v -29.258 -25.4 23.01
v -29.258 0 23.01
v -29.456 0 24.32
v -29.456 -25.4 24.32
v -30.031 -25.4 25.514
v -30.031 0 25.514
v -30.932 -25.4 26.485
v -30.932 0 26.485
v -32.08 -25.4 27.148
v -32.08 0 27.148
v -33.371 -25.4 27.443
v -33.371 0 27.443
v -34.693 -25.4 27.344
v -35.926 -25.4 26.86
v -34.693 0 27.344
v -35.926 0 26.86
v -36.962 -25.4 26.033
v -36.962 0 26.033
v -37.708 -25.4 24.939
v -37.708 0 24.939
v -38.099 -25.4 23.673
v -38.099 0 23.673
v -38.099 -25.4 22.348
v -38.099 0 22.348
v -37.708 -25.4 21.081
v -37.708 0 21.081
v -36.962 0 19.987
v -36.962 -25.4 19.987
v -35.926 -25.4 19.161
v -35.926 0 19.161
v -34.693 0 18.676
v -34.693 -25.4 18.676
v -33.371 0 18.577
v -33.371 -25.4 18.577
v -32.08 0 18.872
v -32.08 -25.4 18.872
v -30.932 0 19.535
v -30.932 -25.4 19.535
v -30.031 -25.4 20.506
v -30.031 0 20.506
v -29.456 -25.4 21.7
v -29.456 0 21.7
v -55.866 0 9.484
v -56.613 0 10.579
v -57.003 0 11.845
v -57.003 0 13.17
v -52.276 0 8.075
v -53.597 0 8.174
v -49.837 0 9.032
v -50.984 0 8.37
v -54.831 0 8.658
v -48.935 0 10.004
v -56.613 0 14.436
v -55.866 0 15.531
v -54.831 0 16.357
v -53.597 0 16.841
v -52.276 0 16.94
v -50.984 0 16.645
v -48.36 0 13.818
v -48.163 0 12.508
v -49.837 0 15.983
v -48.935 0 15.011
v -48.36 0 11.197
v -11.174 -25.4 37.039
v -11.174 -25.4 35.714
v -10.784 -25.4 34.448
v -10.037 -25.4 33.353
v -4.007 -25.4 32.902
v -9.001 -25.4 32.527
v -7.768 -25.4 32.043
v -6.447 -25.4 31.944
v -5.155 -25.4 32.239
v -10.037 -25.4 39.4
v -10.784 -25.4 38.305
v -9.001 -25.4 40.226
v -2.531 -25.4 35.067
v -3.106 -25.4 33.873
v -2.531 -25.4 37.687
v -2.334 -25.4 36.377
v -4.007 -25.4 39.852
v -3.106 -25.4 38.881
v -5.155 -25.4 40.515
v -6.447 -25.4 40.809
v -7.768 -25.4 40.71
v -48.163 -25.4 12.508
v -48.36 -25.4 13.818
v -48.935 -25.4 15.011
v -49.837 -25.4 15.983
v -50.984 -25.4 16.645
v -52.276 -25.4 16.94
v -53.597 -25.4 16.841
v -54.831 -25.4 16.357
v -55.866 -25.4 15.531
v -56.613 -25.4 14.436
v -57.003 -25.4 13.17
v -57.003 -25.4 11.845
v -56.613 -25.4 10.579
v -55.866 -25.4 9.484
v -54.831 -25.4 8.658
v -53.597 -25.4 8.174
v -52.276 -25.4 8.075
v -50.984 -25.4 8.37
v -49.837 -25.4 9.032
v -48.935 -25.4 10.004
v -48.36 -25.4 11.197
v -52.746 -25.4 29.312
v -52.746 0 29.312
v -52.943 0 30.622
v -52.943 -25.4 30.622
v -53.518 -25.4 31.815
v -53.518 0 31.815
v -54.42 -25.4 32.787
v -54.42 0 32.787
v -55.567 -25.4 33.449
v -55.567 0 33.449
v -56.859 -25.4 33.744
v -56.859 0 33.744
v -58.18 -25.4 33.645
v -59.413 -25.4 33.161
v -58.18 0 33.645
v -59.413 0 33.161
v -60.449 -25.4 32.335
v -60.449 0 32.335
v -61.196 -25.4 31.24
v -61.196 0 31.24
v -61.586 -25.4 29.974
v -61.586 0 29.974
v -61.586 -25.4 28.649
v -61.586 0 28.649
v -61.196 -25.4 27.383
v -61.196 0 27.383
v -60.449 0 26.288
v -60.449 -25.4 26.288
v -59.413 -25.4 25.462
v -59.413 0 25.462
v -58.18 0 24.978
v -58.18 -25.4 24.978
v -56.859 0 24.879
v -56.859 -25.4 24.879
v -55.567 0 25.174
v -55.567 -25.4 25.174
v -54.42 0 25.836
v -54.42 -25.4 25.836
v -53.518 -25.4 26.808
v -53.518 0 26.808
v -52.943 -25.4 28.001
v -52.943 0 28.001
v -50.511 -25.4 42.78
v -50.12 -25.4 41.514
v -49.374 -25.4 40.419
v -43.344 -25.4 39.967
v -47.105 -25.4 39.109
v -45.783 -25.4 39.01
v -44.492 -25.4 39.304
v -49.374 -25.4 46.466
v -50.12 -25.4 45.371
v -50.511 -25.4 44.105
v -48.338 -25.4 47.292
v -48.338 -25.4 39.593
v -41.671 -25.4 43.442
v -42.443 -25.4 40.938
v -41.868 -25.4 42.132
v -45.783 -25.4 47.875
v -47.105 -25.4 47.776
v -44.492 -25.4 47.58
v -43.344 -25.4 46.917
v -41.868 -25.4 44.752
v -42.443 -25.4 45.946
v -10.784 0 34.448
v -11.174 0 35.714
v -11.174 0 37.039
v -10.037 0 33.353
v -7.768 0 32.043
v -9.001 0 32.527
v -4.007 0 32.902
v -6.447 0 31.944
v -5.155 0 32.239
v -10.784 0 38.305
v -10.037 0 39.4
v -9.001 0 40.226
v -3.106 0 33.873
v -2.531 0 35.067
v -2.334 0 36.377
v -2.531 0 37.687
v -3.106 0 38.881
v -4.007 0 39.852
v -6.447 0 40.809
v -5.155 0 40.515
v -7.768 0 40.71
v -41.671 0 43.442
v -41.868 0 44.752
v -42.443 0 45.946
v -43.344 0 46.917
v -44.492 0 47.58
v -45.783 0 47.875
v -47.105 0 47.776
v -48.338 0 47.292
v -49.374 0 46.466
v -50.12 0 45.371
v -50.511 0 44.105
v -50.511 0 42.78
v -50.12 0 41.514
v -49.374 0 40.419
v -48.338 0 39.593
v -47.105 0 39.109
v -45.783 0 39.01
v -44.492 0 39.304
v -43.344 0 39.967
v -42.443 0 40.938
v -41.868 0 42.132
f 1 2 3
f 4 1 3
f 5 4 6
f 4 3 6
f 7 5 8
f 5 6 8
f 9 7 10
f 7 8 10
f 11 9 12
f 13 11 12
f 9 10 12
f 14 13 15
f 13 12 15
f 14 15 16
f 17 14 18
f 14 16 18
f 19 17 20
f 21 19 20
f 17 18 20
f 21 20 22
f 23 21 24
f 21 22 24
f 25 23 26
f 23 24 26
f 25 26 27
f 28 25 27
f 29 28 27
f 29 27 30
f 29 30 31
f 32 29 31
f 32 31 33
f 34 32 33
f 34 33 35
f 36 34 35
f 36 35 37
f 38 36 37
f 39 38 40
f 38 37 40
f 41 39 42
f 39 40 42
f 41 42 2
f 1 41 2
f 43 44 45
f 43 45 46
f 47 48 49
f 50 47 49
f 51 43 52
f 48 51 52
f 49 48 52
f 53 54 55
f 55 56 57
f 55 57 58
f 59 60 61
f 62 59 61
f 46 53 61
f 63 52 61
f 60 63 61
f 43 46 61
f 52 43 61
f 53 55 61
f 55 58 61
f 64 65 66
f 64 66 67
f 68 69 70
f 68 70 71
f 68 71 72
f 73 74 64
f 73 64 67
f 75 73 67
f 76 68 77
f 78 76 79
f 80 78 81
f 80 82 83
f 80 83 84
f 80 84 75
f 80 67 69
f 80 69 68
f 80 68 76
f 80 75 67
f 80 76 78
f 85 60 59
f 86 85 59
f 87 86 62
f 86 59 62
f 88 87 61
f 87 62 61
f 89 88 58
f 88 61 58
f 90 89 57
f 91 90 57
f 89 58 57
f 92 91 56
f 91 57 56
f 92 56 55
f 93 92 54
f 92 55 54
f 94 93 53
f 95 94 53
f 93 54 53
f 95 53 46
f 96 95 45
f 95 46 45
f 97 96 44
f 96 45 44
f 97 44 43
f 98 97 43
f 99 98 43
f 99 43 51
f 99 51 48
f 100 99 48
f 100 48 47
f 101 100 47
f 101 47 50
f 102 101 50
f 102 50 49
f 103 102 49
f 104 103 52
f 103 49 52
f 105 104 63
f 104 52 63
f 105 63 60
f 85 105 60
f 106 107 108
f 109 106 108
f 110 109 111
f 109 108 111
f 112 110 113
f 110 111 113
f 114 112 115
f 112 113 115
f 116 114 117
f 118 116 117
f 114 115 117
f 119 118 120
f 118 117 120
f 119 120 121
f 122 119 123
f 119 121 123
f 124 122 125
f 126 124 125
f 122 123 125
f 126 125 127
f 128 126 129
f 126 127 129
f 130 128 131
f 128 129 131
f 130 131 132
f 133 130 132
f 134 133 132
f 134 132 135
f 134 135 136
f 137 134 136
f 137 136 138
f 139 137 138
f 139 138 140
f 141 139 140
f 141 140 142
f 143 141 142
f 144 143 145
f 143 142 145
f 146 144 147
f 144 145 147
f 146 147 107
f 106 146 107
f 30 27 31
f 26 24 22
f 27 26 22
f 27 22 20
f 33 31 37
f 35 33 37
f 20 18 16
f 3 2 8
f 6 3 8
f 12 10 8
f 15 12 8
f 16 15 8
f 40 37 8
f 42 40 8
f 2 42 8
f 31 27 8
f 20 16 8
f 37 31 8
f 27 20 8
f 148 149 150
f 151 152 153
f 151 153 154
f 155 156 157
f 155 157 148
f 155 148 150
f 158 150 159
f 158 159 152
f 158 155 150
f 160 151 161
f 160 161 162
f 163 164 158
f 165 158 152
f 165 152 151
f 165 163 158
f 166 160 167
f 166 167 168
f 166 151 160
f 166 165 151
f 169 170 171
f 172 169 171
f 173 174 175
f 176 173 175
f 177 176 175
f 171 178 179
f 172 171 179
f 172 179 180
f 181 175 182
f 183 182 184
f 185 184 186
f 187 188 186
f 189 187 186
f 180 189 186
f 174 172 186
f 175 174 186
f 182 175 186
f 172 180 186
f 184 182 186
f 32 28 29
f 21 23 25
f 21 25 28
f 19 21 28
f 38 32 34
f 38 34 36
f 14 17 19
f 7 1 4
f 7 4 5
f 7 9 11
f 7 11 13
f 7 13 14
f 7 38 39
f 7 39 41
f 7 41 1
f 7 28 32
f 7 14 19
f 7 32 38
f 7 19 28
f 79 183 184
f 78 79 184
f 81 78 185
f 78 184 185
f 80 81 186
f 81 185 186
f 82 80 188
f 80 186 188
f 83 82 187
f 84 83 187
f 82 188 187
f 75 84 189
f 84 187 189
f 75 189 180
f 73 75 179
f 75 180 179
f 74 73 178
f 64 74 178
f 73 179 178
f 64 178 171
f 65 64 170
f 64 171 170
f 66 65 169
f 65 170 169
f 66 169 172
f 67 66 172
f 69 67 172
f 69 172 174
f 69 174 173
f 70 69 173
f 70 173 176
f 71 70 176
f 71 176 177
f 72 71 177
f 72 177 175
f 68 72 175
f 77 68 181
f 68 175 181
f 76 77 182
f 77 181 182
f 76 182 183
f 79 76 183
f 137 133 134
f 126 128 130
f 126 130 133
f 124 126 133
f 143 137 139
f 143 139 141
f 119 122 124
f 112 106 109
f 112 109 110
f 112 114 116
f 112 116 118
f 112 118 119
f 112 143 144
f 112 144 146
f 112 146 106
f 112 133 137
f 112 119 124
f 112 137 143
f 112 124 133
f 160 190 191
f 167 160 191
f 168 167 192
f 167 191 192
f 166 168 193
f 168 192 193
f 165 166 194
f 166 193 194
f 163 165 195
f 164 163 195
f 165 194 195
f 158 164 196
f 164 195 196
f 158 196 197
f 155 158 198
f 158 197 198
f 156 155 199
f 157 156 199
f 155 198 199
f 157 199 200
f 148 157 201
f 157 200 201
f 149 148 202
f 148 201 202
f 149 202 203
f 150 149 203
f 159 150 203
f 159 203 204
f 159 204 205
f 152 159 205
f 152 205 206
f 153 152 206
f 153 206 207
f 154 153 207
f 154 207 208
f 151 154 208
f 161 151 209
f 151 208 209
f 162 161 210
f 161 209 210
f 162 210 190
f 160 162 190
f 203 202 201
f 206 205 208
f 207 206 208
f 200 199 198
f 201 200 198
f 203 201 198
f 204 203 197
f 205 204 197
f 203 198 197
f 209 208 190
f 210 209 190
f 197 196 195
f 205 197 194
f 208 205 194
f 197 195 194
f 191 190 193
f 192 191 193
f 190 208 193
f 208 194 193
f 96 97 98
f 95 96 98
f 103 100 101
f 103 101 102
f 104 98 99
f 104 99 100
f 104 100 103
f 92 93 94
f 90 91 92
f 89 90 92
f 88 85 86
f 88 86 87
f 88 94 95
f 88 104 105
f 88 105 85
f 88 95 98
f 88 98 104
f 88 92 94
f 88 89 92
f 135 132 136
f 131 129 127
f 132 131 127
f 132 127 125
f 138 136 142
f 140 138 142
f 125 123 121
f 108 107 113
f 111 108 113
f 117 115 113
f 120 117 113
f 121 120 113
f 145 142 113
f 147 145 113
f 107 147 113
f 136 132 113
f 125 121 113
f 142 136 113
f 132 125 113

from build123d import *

# Parameters (mm, degrees)
F0_R     = 4.445
F1_DEPTH = 25.4


with BuildPart() as f1:
    # F0 (on Front) → F1 (new body)
    with BuildSketch(Plane.XZ):
        with Locations((-33.703495, 23.010036)):
            Circle(F0_R)
        with Locations((-6.77889, 36.376864)):
            Circle(F0_R)
        with Locations((-46.115551, 43.442186)):
            Circle(F0_R)
        with Locations((-57.190917, 29.31154)):
            Circle(F0_R)
        with Locations((-52.608009, 12.50753)):
            Circle(F0_R)
    extrude(amount=F1_DEPTH)


solid = f1.part
